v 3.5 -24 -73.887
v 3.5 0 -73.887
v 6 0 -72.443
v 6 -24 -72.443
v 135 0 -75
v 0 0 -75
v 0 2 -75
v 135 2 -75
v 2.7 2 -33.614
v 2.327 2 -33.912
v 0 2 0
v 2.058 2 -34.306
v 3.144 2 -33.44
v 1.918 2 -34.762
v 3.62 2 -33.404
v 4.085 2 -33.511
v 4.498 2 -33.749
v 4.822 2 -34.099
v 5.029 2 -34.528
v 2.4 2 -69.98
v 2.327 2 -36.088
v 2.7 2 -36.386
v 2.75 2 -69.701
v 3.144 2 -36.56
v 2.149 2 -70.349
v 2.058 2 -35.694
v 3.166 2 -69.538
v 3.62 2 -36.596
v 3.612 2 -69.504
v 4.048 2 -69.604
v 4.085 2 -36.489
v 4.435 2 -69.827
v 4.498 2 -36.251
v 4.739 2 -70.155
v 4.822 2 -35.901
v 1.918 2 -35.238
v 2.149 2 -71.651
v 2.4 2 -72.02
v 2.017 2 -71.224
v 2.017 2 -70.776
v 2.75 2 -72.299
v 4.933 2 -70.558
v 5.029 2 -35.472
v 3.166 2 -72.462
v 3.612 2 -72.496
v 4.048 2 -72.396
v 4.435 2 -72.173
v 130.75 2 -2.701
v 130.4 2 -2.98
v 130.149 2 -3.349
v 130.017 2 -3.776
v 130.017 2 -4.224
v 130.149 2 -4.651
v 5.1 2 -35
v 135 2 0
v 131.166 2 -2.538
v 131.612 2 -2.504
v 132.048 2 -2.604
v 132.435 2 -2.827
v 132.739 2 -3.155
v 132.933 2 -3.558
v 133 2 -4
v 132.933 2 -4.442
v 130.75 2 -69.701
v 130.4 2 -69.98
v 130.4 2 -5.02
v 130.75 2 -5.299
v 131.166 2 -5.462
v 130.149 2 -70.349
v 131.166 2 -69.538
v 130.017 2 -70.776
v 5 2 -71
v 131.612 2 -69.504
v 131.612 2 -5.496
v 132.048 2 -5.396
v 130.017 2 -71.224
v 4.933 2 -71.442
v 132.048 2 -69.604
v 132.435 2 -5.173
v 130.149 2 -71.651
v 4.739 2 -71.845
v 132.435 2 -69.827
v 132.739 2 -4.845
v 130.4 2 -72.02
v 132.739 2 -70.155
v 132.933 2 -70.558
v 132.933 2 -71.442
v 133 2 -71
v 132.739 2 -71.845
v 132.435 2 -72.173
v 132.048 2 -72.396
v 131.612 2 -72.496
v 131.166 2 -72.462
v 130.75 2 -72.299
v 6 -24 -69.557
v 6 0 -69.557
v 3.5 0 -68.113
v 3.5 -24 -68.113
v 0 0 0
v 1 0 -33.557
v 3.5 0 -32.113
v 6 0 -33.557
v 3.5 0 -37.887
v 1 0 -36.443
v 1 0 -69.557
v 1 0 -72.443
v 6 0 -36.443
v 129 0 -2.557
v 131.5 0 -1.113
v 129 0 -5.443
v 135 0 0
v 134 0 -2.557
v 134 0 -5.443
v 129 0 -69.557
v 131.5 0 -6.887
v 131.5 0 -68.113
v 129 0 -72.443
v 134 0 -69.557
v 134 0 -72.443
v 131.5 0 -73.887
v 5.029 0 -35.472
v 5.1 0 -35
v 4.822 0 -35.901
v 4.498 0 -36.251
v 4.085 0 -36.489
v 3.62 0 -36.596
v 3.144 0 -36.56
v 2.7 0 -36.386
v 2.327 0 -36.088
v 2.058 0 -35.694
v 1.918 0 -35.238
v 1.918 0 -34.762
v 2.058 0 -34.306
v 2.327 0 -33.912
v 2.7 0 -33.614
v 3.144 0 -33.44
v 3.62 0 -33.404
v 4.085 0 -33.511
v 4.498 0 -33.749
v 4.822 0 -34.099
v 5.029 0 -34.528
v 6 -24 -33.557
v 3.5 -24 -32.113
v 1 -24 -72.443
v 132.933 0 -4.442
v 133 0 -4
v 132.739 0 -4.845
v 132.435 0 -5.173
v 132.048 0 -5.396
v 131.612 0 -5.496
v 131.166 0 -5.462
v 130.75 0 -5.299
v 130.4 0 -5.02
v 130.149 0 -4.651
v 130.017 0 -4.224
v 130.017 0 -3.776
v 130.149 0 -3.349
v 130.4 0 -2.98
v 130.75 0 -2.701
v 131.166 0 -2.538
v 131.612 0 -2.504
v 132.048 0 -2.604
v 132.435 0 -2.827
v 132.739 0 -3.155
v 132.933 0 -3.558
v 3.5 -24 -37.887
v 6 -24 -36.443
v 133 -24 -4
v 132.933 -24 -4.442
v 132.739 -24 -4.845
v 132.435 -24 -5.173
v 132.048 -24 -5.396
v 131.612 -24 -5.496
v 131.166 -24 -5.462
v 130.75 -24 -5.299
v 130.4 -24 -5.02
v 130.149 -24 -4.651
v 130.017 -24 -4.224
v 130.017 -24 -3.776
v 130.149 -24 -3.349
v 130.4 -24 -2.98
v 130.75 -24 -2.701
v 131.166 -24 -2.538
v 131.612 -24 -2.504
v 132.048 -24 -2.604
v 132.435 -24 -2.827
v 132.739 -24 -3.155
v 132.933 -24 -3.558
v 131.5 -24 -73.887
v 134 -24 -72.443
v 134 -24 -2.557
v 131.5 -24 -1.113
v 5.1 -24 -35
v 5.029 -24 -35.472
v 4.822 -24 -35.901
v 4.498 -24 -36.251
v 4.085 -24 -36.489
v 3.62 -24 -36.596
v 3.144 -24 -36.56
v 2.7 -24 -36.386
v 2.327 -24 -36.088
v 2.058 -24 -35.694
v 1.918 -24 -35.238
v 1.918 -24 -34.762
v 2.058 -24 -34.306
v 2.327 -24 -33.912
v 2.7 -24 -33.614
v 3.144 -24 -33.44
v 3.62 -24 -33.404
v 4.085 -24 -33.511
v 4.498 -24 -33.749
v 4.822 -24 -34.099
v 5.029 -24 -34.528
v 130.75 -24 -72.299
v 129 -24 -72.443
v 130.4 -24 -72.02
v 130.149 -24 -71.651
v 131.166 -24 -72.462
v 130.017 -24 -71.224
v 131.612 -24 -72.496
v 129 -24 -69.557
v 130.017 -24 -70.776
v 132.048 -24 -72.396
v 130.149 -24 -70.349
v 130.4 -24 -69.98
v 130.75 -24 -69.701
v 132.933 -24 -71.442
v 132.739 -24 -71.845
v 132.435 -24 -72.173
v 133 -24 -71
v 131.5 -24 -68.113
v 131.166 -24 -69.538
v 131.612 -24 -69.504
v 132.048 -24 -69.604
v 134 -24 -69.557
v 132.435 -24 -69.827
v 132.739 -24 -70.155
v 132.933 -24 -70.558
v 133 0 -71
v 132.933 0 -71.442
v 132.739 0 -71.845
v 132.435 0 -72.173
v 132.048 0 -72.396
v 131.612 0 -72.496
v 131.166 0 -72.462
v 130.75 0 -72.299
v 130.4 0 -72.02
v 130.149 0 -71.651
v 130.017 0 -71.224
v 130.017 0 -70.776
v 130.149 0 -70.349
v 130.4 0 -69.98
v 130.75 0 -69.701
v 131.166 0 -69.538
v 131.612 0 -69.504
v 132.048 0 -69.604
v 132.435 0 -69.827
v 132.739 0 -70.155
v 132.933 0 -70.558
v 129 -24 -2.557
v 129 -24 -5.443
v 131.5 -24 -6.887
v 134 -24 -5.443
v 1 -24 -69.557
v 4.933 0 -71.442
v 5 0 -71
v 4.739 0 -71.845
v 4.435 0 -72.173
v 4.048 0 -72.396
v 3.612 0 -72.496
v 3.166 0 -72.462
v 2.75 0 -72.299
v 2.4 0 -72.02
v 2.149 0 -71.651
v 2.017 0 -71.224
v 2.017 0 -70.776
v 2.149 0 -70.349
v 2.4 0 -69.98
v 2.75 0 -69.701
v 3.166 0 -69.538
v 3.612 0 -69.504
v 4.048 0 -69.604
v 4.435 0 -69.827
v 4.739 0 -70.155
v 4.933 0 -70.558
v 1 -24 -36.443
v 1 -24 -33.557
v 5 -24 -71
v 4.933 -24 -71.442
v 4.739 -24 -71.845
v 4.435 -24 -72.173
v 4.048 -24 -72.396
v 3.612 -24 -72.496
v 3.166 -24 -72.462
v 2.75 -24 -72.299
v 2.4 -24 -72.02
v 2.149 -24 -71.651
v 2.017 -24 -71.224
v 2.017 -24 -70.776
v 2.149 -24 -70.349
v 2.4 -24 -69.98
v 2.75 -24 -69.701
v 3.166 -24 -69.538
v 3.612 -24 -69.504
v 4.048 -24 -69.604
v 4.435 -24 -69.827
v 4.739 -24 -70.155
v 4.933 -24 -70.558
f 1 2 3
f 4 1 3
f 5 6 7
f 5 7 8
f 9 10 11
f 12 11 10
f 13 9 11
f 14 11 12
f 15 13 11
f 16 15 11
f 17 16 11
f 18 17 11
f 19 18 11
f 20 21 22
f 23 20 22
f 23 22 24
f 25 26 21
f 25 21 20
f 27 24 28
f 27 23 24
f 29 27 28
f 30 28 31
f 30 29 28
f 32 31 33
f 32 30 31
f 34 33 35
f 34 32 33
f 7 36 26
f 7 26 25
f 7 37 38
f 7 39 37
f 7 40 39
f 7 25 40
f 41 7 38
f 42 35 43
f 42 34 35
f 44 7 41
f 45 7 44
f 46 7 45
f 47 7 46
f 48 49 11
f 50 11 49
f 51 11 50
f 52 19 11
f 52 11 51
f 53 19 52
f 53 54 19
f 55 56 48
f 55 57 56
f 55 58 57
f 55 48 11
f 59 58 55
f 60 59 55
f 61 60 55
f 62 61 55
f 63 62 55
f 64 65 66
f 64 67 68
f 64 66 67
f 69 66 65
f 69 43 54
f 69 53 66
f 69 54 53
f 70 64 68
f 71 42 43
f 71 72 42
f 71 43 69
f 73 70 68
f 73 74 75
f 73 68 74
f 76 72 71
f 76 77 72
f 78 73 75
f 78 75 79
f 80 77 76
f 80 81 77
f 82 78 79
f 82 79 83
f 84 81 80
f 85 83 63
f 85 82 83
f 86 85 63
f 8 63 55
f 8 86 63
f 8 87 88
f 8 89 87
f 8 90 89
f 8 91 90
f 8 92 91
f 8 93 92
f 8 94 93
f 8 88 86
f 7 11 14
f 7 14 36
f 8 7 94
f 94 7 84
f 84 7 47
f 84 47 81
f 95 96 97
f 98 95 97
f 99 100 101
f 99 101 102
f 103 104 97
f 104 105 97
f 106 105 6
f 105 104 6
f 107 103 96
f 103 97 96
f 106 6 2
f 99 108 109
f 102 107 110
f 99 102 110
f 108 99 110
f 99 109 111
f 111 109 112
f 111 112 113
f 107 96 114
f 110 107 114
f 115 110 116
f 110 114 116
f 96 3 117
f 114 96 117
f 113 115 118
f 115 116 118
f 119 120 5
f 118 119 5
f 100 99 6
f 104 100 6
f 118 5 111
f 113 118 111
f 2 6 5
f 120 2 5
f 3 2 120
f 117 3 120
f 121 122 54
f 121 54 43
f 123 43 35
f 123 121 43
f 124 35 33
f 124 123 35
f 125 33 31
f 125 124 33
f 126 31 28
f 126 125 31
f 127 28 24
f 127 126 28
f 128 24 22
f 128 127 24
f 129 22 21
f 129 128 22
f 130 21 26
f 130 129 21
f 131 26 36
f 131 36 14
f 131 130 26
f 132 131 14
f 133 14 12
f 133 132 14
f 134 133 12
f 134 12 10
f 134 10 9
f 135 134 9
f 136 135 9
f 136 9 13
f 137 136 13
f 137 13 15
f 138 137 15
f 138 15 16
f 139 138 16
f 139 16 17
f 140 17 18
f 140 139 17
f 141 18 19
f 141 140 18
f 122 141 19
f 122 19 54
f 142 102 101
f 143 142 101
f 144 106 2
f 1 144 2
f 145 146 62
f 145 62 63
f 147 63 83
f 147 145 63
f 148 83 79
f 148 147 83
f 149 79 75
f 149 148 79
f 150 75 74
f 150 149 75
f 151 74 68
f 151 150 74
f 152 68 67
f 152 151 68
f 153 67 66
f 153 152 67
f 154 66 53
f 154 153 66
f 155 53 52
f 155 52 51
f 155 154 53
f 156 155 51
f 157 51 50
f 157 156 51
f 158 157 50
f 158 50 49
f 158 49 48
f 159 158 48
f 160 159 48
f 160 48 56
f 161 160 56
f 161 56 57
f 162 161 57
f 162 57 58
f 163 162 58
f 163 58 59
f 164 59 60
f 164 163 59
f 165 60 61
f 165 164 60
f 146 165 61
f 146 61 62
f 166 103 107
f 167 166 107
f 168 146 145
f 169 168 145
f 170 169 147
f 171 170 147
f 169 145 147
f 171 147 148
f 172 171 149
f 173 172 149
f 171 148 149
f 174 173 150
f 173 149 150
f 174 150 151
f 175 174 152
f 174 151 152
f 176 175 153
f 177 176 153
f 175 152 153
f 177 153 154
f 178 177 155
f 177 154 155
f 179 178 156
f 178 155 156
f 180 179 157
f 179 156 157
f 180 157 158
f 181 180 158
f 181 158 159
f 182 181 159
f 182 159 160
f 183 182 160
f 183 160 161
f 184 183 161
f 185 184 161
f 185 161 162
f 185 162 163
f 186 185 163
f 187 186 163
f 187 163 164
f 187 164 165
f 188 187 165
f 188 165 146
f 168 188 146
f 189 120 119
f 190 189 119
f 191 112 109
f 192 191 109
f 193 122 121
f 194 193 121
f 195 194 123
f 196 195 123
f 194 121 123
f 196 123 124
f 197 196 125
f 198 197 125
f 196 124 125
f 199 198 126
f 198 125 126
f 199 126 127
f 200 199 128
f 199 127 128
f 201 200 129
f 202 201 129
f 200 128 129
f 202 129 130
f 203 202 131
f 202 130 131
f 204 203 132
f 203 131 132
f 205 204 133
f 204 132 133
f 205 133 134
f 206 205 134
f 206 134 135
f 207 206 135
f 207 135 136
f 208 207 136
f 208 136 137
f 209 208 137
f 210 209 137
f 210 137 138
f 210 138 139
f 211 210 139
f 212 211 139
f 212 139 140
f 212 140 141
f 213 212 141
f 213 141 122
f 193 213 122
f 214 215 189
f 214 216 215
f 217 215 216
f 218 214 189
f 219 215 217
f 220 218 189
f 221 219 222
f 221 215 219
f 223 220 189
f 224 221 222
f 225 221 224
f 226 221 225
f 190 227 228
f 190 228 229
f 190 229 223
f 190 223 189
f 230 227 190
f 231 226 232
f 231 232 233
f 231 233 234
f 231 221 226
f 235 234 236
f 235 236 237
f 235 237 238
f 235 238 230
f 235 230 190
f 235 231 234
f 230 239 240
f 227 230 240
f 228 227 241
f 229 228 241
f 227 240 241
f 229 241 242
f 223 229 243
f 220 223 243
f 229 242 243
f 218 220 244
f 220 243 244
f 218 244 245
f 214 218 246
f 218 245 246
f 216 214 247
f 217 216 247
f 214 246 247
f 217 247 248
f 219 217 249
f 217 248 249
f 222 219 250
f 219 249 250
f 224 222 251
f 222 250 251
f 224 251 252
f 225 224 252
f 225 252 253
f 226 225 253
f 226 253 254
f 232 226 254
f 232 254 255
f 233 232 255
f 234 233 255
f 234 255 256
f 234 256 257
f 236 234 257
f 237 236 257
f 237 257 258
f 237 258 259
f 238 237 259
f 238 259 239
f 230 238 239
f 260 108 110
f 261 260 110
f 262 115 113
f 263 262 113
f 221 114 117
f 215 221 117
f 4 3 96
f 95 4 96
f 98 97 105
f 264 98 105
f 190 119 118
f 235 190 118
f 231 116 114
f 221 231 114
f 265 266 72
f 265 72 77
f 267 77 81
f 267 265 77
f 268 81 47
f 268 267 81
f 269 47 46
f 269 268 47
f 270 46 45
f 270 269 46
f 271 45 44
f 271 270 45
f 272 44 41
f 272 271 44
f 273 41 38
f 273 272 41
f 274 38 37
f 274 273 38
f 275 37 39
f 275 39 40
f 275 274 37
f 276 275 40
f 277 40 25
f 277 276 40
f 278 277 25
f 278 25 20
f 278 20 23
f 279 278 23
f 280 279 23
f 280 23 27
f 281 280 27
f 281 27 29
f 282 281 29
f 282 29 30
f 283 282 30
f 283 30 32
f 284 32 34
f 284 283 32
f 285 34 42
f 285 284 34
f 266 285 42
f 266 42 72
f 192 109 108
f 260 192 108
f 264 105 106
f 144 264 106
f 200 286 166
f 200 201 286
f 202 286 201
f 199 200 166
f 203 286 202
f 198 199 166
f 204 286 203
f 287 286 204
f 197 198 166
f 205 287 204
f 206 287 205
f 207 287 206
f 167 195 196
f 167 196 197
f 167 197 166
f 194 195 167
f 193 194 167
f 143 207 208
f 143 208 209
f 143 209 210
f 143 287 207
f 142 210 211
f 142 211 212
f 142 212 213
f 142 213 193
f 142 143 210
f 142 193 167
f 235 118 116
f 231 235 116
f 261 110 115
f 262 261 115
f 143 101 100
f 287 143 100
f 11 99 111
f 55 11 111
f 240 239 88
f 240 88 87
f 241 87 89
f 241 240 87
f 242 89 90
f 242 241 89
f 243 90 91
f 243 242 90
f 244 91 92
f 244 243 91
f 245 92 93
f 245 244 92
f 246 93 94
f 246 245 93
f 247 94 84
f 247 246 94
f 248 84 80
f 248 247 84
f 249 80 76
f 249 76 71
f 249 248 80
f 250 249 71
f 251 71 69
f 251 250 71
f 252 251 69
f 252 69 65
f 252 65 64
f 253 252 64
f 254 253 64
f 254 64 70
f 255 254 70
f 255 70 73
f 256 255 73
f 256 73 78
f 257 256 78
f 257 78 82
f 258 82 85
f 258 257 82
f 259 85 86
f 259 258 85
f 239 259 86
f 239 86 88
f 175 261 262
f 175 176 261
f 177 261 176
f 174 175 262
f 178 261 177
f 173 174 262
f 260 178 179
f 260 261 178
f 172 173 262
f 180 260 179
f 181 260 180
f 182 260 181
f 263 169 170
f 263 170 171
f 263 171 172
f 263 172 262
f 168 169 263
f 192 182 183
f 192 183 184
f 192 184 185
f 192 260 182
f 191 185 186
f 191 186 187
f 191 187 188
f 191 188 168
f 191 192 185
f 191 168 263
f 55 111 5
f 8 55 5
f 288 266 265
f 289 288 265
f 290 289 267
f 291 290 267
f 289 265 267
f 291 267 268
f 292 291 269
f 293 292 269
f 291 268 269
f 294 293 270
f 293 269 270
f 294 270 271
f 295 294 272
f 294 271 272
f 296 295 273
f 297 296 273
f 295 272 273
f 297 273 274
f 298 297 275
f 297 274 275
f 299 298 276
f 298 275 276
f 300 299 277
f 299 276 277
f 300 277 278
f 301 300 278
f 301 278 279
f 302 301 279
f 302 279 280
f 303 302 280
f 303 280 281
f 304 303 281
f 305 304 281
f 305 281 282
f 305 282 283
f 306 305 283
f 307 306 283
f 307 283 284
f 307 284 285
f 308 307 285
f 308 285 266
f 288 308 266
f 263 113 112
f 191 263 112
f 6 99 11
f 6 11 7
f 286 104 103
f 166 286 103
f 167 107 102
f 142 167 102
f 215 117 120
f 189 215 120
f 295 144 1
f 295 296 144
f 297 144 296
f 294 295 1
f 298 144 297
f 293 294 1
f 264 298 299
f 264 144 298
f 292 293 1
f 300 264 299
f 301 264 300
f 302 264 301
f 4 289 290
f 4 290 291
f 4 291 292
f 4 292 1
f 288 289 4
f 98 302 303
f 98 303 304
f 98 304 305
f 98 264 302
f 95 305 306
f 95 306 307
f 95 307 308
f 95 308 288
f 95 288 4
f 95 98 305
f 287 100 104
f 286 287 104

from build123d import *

# Parameters (mm, degrees)
SKETCH_1_W          = 135
SKETCH_1_H          = 75
SKETCH_1_R          = 1.5
SKETCH_1_R_2        = 1.6
EXTRUDE_1_DEPTH     = 2
EXTRUDE_2_DEPTH     = 24
SKETCH_3_R          = 1.5
SKETCH_3_R_2        = 1.6
CUT_EXTRUDE_1_DEPTH = 25


with BuildPart() as part:
    # Эскиз1 → Бобышка-Вытянуть1 (new body)
    with BuildSketch(Plane(origin=(0, 0, 0), x_dir=(1, 0, 0), z_dir=(0, 1, 0))):
        with Locations((67.5, 37.5)):
            Rectangle(SKETCH_1_W, SKETCH_1_H)
        with Locations((3.5, 71)):
            Circle(SKETCH_1_R, mode=Mode.SUBTRACT)
        with Locations((3.5, 35)):
            Circle(SKETCH_1_R_2, mode=Mode.SUBTRACT)
        with Locations((131.5, 71)):
            Circle(SKETCH_1_R, mode=Mode.SUBTRACT)
        with Locations((131.5, 4)):
            Circle(SKETCH_1_R, mode=Mode.SUBTRACT)
    extrude(amount=EXTRUDE_1_DEPTH)

    # Эскиз2 → Бобышка-Вытянуть2 (add)
    with BuildSketch(Plane.XZ):
        Polygon((3.5, -37.886751346), (6, -36.443375673), (6, -33.556624327), (3.5, -32.113248654), (1, -33.556624327), (1, -36.443375673), align=None)
        Polygon((3.5, -73.886751346), (6, -72.443375673), (6, -69.556624327), (3.5, -68.113248654), (1, -69.556624327), (1, -72.443375673), align=None)
        Polygon((131.5, -6.886751346), (134, -5.443375673), (134, -2.556624327), (131.5, -1.113248654), (129, -2.556624327), (129, -5.443375673), align=None)
        Polygon((129, -72.443375673), (131.5, -73.886751346), (134, -72.443375673), (134, -69.556624327), (131.5, -68.113248654), (129, -69.556624327), align=None)
    extrude(amount=EXTRUDE_2_DEPTH)

    # Эскиз3 → Вырез-Вытянуть1 (cut, through all)
    with BuildSketch(Plane(origin=(0, 0, 0), x_dir=(1, 0, 0), z_dir=(0, 1, 0))):
        with Locations((3.5, 71)):
            Circle(SKETCH_3_R)
        with Locations((131.5, 4)):
            Circle(SKETCH_3_R)
        with Locations((131.5, 71)):
            Circle(SKETCH_3_R)
        with Locations((3.5, 35)):
            Circle(SKETCH_3_R_2)
    extrude(amount=-CUT_EXTRUDE_1_DEPTH, mode=Mode.SUBTRACT)


solid = part.part
